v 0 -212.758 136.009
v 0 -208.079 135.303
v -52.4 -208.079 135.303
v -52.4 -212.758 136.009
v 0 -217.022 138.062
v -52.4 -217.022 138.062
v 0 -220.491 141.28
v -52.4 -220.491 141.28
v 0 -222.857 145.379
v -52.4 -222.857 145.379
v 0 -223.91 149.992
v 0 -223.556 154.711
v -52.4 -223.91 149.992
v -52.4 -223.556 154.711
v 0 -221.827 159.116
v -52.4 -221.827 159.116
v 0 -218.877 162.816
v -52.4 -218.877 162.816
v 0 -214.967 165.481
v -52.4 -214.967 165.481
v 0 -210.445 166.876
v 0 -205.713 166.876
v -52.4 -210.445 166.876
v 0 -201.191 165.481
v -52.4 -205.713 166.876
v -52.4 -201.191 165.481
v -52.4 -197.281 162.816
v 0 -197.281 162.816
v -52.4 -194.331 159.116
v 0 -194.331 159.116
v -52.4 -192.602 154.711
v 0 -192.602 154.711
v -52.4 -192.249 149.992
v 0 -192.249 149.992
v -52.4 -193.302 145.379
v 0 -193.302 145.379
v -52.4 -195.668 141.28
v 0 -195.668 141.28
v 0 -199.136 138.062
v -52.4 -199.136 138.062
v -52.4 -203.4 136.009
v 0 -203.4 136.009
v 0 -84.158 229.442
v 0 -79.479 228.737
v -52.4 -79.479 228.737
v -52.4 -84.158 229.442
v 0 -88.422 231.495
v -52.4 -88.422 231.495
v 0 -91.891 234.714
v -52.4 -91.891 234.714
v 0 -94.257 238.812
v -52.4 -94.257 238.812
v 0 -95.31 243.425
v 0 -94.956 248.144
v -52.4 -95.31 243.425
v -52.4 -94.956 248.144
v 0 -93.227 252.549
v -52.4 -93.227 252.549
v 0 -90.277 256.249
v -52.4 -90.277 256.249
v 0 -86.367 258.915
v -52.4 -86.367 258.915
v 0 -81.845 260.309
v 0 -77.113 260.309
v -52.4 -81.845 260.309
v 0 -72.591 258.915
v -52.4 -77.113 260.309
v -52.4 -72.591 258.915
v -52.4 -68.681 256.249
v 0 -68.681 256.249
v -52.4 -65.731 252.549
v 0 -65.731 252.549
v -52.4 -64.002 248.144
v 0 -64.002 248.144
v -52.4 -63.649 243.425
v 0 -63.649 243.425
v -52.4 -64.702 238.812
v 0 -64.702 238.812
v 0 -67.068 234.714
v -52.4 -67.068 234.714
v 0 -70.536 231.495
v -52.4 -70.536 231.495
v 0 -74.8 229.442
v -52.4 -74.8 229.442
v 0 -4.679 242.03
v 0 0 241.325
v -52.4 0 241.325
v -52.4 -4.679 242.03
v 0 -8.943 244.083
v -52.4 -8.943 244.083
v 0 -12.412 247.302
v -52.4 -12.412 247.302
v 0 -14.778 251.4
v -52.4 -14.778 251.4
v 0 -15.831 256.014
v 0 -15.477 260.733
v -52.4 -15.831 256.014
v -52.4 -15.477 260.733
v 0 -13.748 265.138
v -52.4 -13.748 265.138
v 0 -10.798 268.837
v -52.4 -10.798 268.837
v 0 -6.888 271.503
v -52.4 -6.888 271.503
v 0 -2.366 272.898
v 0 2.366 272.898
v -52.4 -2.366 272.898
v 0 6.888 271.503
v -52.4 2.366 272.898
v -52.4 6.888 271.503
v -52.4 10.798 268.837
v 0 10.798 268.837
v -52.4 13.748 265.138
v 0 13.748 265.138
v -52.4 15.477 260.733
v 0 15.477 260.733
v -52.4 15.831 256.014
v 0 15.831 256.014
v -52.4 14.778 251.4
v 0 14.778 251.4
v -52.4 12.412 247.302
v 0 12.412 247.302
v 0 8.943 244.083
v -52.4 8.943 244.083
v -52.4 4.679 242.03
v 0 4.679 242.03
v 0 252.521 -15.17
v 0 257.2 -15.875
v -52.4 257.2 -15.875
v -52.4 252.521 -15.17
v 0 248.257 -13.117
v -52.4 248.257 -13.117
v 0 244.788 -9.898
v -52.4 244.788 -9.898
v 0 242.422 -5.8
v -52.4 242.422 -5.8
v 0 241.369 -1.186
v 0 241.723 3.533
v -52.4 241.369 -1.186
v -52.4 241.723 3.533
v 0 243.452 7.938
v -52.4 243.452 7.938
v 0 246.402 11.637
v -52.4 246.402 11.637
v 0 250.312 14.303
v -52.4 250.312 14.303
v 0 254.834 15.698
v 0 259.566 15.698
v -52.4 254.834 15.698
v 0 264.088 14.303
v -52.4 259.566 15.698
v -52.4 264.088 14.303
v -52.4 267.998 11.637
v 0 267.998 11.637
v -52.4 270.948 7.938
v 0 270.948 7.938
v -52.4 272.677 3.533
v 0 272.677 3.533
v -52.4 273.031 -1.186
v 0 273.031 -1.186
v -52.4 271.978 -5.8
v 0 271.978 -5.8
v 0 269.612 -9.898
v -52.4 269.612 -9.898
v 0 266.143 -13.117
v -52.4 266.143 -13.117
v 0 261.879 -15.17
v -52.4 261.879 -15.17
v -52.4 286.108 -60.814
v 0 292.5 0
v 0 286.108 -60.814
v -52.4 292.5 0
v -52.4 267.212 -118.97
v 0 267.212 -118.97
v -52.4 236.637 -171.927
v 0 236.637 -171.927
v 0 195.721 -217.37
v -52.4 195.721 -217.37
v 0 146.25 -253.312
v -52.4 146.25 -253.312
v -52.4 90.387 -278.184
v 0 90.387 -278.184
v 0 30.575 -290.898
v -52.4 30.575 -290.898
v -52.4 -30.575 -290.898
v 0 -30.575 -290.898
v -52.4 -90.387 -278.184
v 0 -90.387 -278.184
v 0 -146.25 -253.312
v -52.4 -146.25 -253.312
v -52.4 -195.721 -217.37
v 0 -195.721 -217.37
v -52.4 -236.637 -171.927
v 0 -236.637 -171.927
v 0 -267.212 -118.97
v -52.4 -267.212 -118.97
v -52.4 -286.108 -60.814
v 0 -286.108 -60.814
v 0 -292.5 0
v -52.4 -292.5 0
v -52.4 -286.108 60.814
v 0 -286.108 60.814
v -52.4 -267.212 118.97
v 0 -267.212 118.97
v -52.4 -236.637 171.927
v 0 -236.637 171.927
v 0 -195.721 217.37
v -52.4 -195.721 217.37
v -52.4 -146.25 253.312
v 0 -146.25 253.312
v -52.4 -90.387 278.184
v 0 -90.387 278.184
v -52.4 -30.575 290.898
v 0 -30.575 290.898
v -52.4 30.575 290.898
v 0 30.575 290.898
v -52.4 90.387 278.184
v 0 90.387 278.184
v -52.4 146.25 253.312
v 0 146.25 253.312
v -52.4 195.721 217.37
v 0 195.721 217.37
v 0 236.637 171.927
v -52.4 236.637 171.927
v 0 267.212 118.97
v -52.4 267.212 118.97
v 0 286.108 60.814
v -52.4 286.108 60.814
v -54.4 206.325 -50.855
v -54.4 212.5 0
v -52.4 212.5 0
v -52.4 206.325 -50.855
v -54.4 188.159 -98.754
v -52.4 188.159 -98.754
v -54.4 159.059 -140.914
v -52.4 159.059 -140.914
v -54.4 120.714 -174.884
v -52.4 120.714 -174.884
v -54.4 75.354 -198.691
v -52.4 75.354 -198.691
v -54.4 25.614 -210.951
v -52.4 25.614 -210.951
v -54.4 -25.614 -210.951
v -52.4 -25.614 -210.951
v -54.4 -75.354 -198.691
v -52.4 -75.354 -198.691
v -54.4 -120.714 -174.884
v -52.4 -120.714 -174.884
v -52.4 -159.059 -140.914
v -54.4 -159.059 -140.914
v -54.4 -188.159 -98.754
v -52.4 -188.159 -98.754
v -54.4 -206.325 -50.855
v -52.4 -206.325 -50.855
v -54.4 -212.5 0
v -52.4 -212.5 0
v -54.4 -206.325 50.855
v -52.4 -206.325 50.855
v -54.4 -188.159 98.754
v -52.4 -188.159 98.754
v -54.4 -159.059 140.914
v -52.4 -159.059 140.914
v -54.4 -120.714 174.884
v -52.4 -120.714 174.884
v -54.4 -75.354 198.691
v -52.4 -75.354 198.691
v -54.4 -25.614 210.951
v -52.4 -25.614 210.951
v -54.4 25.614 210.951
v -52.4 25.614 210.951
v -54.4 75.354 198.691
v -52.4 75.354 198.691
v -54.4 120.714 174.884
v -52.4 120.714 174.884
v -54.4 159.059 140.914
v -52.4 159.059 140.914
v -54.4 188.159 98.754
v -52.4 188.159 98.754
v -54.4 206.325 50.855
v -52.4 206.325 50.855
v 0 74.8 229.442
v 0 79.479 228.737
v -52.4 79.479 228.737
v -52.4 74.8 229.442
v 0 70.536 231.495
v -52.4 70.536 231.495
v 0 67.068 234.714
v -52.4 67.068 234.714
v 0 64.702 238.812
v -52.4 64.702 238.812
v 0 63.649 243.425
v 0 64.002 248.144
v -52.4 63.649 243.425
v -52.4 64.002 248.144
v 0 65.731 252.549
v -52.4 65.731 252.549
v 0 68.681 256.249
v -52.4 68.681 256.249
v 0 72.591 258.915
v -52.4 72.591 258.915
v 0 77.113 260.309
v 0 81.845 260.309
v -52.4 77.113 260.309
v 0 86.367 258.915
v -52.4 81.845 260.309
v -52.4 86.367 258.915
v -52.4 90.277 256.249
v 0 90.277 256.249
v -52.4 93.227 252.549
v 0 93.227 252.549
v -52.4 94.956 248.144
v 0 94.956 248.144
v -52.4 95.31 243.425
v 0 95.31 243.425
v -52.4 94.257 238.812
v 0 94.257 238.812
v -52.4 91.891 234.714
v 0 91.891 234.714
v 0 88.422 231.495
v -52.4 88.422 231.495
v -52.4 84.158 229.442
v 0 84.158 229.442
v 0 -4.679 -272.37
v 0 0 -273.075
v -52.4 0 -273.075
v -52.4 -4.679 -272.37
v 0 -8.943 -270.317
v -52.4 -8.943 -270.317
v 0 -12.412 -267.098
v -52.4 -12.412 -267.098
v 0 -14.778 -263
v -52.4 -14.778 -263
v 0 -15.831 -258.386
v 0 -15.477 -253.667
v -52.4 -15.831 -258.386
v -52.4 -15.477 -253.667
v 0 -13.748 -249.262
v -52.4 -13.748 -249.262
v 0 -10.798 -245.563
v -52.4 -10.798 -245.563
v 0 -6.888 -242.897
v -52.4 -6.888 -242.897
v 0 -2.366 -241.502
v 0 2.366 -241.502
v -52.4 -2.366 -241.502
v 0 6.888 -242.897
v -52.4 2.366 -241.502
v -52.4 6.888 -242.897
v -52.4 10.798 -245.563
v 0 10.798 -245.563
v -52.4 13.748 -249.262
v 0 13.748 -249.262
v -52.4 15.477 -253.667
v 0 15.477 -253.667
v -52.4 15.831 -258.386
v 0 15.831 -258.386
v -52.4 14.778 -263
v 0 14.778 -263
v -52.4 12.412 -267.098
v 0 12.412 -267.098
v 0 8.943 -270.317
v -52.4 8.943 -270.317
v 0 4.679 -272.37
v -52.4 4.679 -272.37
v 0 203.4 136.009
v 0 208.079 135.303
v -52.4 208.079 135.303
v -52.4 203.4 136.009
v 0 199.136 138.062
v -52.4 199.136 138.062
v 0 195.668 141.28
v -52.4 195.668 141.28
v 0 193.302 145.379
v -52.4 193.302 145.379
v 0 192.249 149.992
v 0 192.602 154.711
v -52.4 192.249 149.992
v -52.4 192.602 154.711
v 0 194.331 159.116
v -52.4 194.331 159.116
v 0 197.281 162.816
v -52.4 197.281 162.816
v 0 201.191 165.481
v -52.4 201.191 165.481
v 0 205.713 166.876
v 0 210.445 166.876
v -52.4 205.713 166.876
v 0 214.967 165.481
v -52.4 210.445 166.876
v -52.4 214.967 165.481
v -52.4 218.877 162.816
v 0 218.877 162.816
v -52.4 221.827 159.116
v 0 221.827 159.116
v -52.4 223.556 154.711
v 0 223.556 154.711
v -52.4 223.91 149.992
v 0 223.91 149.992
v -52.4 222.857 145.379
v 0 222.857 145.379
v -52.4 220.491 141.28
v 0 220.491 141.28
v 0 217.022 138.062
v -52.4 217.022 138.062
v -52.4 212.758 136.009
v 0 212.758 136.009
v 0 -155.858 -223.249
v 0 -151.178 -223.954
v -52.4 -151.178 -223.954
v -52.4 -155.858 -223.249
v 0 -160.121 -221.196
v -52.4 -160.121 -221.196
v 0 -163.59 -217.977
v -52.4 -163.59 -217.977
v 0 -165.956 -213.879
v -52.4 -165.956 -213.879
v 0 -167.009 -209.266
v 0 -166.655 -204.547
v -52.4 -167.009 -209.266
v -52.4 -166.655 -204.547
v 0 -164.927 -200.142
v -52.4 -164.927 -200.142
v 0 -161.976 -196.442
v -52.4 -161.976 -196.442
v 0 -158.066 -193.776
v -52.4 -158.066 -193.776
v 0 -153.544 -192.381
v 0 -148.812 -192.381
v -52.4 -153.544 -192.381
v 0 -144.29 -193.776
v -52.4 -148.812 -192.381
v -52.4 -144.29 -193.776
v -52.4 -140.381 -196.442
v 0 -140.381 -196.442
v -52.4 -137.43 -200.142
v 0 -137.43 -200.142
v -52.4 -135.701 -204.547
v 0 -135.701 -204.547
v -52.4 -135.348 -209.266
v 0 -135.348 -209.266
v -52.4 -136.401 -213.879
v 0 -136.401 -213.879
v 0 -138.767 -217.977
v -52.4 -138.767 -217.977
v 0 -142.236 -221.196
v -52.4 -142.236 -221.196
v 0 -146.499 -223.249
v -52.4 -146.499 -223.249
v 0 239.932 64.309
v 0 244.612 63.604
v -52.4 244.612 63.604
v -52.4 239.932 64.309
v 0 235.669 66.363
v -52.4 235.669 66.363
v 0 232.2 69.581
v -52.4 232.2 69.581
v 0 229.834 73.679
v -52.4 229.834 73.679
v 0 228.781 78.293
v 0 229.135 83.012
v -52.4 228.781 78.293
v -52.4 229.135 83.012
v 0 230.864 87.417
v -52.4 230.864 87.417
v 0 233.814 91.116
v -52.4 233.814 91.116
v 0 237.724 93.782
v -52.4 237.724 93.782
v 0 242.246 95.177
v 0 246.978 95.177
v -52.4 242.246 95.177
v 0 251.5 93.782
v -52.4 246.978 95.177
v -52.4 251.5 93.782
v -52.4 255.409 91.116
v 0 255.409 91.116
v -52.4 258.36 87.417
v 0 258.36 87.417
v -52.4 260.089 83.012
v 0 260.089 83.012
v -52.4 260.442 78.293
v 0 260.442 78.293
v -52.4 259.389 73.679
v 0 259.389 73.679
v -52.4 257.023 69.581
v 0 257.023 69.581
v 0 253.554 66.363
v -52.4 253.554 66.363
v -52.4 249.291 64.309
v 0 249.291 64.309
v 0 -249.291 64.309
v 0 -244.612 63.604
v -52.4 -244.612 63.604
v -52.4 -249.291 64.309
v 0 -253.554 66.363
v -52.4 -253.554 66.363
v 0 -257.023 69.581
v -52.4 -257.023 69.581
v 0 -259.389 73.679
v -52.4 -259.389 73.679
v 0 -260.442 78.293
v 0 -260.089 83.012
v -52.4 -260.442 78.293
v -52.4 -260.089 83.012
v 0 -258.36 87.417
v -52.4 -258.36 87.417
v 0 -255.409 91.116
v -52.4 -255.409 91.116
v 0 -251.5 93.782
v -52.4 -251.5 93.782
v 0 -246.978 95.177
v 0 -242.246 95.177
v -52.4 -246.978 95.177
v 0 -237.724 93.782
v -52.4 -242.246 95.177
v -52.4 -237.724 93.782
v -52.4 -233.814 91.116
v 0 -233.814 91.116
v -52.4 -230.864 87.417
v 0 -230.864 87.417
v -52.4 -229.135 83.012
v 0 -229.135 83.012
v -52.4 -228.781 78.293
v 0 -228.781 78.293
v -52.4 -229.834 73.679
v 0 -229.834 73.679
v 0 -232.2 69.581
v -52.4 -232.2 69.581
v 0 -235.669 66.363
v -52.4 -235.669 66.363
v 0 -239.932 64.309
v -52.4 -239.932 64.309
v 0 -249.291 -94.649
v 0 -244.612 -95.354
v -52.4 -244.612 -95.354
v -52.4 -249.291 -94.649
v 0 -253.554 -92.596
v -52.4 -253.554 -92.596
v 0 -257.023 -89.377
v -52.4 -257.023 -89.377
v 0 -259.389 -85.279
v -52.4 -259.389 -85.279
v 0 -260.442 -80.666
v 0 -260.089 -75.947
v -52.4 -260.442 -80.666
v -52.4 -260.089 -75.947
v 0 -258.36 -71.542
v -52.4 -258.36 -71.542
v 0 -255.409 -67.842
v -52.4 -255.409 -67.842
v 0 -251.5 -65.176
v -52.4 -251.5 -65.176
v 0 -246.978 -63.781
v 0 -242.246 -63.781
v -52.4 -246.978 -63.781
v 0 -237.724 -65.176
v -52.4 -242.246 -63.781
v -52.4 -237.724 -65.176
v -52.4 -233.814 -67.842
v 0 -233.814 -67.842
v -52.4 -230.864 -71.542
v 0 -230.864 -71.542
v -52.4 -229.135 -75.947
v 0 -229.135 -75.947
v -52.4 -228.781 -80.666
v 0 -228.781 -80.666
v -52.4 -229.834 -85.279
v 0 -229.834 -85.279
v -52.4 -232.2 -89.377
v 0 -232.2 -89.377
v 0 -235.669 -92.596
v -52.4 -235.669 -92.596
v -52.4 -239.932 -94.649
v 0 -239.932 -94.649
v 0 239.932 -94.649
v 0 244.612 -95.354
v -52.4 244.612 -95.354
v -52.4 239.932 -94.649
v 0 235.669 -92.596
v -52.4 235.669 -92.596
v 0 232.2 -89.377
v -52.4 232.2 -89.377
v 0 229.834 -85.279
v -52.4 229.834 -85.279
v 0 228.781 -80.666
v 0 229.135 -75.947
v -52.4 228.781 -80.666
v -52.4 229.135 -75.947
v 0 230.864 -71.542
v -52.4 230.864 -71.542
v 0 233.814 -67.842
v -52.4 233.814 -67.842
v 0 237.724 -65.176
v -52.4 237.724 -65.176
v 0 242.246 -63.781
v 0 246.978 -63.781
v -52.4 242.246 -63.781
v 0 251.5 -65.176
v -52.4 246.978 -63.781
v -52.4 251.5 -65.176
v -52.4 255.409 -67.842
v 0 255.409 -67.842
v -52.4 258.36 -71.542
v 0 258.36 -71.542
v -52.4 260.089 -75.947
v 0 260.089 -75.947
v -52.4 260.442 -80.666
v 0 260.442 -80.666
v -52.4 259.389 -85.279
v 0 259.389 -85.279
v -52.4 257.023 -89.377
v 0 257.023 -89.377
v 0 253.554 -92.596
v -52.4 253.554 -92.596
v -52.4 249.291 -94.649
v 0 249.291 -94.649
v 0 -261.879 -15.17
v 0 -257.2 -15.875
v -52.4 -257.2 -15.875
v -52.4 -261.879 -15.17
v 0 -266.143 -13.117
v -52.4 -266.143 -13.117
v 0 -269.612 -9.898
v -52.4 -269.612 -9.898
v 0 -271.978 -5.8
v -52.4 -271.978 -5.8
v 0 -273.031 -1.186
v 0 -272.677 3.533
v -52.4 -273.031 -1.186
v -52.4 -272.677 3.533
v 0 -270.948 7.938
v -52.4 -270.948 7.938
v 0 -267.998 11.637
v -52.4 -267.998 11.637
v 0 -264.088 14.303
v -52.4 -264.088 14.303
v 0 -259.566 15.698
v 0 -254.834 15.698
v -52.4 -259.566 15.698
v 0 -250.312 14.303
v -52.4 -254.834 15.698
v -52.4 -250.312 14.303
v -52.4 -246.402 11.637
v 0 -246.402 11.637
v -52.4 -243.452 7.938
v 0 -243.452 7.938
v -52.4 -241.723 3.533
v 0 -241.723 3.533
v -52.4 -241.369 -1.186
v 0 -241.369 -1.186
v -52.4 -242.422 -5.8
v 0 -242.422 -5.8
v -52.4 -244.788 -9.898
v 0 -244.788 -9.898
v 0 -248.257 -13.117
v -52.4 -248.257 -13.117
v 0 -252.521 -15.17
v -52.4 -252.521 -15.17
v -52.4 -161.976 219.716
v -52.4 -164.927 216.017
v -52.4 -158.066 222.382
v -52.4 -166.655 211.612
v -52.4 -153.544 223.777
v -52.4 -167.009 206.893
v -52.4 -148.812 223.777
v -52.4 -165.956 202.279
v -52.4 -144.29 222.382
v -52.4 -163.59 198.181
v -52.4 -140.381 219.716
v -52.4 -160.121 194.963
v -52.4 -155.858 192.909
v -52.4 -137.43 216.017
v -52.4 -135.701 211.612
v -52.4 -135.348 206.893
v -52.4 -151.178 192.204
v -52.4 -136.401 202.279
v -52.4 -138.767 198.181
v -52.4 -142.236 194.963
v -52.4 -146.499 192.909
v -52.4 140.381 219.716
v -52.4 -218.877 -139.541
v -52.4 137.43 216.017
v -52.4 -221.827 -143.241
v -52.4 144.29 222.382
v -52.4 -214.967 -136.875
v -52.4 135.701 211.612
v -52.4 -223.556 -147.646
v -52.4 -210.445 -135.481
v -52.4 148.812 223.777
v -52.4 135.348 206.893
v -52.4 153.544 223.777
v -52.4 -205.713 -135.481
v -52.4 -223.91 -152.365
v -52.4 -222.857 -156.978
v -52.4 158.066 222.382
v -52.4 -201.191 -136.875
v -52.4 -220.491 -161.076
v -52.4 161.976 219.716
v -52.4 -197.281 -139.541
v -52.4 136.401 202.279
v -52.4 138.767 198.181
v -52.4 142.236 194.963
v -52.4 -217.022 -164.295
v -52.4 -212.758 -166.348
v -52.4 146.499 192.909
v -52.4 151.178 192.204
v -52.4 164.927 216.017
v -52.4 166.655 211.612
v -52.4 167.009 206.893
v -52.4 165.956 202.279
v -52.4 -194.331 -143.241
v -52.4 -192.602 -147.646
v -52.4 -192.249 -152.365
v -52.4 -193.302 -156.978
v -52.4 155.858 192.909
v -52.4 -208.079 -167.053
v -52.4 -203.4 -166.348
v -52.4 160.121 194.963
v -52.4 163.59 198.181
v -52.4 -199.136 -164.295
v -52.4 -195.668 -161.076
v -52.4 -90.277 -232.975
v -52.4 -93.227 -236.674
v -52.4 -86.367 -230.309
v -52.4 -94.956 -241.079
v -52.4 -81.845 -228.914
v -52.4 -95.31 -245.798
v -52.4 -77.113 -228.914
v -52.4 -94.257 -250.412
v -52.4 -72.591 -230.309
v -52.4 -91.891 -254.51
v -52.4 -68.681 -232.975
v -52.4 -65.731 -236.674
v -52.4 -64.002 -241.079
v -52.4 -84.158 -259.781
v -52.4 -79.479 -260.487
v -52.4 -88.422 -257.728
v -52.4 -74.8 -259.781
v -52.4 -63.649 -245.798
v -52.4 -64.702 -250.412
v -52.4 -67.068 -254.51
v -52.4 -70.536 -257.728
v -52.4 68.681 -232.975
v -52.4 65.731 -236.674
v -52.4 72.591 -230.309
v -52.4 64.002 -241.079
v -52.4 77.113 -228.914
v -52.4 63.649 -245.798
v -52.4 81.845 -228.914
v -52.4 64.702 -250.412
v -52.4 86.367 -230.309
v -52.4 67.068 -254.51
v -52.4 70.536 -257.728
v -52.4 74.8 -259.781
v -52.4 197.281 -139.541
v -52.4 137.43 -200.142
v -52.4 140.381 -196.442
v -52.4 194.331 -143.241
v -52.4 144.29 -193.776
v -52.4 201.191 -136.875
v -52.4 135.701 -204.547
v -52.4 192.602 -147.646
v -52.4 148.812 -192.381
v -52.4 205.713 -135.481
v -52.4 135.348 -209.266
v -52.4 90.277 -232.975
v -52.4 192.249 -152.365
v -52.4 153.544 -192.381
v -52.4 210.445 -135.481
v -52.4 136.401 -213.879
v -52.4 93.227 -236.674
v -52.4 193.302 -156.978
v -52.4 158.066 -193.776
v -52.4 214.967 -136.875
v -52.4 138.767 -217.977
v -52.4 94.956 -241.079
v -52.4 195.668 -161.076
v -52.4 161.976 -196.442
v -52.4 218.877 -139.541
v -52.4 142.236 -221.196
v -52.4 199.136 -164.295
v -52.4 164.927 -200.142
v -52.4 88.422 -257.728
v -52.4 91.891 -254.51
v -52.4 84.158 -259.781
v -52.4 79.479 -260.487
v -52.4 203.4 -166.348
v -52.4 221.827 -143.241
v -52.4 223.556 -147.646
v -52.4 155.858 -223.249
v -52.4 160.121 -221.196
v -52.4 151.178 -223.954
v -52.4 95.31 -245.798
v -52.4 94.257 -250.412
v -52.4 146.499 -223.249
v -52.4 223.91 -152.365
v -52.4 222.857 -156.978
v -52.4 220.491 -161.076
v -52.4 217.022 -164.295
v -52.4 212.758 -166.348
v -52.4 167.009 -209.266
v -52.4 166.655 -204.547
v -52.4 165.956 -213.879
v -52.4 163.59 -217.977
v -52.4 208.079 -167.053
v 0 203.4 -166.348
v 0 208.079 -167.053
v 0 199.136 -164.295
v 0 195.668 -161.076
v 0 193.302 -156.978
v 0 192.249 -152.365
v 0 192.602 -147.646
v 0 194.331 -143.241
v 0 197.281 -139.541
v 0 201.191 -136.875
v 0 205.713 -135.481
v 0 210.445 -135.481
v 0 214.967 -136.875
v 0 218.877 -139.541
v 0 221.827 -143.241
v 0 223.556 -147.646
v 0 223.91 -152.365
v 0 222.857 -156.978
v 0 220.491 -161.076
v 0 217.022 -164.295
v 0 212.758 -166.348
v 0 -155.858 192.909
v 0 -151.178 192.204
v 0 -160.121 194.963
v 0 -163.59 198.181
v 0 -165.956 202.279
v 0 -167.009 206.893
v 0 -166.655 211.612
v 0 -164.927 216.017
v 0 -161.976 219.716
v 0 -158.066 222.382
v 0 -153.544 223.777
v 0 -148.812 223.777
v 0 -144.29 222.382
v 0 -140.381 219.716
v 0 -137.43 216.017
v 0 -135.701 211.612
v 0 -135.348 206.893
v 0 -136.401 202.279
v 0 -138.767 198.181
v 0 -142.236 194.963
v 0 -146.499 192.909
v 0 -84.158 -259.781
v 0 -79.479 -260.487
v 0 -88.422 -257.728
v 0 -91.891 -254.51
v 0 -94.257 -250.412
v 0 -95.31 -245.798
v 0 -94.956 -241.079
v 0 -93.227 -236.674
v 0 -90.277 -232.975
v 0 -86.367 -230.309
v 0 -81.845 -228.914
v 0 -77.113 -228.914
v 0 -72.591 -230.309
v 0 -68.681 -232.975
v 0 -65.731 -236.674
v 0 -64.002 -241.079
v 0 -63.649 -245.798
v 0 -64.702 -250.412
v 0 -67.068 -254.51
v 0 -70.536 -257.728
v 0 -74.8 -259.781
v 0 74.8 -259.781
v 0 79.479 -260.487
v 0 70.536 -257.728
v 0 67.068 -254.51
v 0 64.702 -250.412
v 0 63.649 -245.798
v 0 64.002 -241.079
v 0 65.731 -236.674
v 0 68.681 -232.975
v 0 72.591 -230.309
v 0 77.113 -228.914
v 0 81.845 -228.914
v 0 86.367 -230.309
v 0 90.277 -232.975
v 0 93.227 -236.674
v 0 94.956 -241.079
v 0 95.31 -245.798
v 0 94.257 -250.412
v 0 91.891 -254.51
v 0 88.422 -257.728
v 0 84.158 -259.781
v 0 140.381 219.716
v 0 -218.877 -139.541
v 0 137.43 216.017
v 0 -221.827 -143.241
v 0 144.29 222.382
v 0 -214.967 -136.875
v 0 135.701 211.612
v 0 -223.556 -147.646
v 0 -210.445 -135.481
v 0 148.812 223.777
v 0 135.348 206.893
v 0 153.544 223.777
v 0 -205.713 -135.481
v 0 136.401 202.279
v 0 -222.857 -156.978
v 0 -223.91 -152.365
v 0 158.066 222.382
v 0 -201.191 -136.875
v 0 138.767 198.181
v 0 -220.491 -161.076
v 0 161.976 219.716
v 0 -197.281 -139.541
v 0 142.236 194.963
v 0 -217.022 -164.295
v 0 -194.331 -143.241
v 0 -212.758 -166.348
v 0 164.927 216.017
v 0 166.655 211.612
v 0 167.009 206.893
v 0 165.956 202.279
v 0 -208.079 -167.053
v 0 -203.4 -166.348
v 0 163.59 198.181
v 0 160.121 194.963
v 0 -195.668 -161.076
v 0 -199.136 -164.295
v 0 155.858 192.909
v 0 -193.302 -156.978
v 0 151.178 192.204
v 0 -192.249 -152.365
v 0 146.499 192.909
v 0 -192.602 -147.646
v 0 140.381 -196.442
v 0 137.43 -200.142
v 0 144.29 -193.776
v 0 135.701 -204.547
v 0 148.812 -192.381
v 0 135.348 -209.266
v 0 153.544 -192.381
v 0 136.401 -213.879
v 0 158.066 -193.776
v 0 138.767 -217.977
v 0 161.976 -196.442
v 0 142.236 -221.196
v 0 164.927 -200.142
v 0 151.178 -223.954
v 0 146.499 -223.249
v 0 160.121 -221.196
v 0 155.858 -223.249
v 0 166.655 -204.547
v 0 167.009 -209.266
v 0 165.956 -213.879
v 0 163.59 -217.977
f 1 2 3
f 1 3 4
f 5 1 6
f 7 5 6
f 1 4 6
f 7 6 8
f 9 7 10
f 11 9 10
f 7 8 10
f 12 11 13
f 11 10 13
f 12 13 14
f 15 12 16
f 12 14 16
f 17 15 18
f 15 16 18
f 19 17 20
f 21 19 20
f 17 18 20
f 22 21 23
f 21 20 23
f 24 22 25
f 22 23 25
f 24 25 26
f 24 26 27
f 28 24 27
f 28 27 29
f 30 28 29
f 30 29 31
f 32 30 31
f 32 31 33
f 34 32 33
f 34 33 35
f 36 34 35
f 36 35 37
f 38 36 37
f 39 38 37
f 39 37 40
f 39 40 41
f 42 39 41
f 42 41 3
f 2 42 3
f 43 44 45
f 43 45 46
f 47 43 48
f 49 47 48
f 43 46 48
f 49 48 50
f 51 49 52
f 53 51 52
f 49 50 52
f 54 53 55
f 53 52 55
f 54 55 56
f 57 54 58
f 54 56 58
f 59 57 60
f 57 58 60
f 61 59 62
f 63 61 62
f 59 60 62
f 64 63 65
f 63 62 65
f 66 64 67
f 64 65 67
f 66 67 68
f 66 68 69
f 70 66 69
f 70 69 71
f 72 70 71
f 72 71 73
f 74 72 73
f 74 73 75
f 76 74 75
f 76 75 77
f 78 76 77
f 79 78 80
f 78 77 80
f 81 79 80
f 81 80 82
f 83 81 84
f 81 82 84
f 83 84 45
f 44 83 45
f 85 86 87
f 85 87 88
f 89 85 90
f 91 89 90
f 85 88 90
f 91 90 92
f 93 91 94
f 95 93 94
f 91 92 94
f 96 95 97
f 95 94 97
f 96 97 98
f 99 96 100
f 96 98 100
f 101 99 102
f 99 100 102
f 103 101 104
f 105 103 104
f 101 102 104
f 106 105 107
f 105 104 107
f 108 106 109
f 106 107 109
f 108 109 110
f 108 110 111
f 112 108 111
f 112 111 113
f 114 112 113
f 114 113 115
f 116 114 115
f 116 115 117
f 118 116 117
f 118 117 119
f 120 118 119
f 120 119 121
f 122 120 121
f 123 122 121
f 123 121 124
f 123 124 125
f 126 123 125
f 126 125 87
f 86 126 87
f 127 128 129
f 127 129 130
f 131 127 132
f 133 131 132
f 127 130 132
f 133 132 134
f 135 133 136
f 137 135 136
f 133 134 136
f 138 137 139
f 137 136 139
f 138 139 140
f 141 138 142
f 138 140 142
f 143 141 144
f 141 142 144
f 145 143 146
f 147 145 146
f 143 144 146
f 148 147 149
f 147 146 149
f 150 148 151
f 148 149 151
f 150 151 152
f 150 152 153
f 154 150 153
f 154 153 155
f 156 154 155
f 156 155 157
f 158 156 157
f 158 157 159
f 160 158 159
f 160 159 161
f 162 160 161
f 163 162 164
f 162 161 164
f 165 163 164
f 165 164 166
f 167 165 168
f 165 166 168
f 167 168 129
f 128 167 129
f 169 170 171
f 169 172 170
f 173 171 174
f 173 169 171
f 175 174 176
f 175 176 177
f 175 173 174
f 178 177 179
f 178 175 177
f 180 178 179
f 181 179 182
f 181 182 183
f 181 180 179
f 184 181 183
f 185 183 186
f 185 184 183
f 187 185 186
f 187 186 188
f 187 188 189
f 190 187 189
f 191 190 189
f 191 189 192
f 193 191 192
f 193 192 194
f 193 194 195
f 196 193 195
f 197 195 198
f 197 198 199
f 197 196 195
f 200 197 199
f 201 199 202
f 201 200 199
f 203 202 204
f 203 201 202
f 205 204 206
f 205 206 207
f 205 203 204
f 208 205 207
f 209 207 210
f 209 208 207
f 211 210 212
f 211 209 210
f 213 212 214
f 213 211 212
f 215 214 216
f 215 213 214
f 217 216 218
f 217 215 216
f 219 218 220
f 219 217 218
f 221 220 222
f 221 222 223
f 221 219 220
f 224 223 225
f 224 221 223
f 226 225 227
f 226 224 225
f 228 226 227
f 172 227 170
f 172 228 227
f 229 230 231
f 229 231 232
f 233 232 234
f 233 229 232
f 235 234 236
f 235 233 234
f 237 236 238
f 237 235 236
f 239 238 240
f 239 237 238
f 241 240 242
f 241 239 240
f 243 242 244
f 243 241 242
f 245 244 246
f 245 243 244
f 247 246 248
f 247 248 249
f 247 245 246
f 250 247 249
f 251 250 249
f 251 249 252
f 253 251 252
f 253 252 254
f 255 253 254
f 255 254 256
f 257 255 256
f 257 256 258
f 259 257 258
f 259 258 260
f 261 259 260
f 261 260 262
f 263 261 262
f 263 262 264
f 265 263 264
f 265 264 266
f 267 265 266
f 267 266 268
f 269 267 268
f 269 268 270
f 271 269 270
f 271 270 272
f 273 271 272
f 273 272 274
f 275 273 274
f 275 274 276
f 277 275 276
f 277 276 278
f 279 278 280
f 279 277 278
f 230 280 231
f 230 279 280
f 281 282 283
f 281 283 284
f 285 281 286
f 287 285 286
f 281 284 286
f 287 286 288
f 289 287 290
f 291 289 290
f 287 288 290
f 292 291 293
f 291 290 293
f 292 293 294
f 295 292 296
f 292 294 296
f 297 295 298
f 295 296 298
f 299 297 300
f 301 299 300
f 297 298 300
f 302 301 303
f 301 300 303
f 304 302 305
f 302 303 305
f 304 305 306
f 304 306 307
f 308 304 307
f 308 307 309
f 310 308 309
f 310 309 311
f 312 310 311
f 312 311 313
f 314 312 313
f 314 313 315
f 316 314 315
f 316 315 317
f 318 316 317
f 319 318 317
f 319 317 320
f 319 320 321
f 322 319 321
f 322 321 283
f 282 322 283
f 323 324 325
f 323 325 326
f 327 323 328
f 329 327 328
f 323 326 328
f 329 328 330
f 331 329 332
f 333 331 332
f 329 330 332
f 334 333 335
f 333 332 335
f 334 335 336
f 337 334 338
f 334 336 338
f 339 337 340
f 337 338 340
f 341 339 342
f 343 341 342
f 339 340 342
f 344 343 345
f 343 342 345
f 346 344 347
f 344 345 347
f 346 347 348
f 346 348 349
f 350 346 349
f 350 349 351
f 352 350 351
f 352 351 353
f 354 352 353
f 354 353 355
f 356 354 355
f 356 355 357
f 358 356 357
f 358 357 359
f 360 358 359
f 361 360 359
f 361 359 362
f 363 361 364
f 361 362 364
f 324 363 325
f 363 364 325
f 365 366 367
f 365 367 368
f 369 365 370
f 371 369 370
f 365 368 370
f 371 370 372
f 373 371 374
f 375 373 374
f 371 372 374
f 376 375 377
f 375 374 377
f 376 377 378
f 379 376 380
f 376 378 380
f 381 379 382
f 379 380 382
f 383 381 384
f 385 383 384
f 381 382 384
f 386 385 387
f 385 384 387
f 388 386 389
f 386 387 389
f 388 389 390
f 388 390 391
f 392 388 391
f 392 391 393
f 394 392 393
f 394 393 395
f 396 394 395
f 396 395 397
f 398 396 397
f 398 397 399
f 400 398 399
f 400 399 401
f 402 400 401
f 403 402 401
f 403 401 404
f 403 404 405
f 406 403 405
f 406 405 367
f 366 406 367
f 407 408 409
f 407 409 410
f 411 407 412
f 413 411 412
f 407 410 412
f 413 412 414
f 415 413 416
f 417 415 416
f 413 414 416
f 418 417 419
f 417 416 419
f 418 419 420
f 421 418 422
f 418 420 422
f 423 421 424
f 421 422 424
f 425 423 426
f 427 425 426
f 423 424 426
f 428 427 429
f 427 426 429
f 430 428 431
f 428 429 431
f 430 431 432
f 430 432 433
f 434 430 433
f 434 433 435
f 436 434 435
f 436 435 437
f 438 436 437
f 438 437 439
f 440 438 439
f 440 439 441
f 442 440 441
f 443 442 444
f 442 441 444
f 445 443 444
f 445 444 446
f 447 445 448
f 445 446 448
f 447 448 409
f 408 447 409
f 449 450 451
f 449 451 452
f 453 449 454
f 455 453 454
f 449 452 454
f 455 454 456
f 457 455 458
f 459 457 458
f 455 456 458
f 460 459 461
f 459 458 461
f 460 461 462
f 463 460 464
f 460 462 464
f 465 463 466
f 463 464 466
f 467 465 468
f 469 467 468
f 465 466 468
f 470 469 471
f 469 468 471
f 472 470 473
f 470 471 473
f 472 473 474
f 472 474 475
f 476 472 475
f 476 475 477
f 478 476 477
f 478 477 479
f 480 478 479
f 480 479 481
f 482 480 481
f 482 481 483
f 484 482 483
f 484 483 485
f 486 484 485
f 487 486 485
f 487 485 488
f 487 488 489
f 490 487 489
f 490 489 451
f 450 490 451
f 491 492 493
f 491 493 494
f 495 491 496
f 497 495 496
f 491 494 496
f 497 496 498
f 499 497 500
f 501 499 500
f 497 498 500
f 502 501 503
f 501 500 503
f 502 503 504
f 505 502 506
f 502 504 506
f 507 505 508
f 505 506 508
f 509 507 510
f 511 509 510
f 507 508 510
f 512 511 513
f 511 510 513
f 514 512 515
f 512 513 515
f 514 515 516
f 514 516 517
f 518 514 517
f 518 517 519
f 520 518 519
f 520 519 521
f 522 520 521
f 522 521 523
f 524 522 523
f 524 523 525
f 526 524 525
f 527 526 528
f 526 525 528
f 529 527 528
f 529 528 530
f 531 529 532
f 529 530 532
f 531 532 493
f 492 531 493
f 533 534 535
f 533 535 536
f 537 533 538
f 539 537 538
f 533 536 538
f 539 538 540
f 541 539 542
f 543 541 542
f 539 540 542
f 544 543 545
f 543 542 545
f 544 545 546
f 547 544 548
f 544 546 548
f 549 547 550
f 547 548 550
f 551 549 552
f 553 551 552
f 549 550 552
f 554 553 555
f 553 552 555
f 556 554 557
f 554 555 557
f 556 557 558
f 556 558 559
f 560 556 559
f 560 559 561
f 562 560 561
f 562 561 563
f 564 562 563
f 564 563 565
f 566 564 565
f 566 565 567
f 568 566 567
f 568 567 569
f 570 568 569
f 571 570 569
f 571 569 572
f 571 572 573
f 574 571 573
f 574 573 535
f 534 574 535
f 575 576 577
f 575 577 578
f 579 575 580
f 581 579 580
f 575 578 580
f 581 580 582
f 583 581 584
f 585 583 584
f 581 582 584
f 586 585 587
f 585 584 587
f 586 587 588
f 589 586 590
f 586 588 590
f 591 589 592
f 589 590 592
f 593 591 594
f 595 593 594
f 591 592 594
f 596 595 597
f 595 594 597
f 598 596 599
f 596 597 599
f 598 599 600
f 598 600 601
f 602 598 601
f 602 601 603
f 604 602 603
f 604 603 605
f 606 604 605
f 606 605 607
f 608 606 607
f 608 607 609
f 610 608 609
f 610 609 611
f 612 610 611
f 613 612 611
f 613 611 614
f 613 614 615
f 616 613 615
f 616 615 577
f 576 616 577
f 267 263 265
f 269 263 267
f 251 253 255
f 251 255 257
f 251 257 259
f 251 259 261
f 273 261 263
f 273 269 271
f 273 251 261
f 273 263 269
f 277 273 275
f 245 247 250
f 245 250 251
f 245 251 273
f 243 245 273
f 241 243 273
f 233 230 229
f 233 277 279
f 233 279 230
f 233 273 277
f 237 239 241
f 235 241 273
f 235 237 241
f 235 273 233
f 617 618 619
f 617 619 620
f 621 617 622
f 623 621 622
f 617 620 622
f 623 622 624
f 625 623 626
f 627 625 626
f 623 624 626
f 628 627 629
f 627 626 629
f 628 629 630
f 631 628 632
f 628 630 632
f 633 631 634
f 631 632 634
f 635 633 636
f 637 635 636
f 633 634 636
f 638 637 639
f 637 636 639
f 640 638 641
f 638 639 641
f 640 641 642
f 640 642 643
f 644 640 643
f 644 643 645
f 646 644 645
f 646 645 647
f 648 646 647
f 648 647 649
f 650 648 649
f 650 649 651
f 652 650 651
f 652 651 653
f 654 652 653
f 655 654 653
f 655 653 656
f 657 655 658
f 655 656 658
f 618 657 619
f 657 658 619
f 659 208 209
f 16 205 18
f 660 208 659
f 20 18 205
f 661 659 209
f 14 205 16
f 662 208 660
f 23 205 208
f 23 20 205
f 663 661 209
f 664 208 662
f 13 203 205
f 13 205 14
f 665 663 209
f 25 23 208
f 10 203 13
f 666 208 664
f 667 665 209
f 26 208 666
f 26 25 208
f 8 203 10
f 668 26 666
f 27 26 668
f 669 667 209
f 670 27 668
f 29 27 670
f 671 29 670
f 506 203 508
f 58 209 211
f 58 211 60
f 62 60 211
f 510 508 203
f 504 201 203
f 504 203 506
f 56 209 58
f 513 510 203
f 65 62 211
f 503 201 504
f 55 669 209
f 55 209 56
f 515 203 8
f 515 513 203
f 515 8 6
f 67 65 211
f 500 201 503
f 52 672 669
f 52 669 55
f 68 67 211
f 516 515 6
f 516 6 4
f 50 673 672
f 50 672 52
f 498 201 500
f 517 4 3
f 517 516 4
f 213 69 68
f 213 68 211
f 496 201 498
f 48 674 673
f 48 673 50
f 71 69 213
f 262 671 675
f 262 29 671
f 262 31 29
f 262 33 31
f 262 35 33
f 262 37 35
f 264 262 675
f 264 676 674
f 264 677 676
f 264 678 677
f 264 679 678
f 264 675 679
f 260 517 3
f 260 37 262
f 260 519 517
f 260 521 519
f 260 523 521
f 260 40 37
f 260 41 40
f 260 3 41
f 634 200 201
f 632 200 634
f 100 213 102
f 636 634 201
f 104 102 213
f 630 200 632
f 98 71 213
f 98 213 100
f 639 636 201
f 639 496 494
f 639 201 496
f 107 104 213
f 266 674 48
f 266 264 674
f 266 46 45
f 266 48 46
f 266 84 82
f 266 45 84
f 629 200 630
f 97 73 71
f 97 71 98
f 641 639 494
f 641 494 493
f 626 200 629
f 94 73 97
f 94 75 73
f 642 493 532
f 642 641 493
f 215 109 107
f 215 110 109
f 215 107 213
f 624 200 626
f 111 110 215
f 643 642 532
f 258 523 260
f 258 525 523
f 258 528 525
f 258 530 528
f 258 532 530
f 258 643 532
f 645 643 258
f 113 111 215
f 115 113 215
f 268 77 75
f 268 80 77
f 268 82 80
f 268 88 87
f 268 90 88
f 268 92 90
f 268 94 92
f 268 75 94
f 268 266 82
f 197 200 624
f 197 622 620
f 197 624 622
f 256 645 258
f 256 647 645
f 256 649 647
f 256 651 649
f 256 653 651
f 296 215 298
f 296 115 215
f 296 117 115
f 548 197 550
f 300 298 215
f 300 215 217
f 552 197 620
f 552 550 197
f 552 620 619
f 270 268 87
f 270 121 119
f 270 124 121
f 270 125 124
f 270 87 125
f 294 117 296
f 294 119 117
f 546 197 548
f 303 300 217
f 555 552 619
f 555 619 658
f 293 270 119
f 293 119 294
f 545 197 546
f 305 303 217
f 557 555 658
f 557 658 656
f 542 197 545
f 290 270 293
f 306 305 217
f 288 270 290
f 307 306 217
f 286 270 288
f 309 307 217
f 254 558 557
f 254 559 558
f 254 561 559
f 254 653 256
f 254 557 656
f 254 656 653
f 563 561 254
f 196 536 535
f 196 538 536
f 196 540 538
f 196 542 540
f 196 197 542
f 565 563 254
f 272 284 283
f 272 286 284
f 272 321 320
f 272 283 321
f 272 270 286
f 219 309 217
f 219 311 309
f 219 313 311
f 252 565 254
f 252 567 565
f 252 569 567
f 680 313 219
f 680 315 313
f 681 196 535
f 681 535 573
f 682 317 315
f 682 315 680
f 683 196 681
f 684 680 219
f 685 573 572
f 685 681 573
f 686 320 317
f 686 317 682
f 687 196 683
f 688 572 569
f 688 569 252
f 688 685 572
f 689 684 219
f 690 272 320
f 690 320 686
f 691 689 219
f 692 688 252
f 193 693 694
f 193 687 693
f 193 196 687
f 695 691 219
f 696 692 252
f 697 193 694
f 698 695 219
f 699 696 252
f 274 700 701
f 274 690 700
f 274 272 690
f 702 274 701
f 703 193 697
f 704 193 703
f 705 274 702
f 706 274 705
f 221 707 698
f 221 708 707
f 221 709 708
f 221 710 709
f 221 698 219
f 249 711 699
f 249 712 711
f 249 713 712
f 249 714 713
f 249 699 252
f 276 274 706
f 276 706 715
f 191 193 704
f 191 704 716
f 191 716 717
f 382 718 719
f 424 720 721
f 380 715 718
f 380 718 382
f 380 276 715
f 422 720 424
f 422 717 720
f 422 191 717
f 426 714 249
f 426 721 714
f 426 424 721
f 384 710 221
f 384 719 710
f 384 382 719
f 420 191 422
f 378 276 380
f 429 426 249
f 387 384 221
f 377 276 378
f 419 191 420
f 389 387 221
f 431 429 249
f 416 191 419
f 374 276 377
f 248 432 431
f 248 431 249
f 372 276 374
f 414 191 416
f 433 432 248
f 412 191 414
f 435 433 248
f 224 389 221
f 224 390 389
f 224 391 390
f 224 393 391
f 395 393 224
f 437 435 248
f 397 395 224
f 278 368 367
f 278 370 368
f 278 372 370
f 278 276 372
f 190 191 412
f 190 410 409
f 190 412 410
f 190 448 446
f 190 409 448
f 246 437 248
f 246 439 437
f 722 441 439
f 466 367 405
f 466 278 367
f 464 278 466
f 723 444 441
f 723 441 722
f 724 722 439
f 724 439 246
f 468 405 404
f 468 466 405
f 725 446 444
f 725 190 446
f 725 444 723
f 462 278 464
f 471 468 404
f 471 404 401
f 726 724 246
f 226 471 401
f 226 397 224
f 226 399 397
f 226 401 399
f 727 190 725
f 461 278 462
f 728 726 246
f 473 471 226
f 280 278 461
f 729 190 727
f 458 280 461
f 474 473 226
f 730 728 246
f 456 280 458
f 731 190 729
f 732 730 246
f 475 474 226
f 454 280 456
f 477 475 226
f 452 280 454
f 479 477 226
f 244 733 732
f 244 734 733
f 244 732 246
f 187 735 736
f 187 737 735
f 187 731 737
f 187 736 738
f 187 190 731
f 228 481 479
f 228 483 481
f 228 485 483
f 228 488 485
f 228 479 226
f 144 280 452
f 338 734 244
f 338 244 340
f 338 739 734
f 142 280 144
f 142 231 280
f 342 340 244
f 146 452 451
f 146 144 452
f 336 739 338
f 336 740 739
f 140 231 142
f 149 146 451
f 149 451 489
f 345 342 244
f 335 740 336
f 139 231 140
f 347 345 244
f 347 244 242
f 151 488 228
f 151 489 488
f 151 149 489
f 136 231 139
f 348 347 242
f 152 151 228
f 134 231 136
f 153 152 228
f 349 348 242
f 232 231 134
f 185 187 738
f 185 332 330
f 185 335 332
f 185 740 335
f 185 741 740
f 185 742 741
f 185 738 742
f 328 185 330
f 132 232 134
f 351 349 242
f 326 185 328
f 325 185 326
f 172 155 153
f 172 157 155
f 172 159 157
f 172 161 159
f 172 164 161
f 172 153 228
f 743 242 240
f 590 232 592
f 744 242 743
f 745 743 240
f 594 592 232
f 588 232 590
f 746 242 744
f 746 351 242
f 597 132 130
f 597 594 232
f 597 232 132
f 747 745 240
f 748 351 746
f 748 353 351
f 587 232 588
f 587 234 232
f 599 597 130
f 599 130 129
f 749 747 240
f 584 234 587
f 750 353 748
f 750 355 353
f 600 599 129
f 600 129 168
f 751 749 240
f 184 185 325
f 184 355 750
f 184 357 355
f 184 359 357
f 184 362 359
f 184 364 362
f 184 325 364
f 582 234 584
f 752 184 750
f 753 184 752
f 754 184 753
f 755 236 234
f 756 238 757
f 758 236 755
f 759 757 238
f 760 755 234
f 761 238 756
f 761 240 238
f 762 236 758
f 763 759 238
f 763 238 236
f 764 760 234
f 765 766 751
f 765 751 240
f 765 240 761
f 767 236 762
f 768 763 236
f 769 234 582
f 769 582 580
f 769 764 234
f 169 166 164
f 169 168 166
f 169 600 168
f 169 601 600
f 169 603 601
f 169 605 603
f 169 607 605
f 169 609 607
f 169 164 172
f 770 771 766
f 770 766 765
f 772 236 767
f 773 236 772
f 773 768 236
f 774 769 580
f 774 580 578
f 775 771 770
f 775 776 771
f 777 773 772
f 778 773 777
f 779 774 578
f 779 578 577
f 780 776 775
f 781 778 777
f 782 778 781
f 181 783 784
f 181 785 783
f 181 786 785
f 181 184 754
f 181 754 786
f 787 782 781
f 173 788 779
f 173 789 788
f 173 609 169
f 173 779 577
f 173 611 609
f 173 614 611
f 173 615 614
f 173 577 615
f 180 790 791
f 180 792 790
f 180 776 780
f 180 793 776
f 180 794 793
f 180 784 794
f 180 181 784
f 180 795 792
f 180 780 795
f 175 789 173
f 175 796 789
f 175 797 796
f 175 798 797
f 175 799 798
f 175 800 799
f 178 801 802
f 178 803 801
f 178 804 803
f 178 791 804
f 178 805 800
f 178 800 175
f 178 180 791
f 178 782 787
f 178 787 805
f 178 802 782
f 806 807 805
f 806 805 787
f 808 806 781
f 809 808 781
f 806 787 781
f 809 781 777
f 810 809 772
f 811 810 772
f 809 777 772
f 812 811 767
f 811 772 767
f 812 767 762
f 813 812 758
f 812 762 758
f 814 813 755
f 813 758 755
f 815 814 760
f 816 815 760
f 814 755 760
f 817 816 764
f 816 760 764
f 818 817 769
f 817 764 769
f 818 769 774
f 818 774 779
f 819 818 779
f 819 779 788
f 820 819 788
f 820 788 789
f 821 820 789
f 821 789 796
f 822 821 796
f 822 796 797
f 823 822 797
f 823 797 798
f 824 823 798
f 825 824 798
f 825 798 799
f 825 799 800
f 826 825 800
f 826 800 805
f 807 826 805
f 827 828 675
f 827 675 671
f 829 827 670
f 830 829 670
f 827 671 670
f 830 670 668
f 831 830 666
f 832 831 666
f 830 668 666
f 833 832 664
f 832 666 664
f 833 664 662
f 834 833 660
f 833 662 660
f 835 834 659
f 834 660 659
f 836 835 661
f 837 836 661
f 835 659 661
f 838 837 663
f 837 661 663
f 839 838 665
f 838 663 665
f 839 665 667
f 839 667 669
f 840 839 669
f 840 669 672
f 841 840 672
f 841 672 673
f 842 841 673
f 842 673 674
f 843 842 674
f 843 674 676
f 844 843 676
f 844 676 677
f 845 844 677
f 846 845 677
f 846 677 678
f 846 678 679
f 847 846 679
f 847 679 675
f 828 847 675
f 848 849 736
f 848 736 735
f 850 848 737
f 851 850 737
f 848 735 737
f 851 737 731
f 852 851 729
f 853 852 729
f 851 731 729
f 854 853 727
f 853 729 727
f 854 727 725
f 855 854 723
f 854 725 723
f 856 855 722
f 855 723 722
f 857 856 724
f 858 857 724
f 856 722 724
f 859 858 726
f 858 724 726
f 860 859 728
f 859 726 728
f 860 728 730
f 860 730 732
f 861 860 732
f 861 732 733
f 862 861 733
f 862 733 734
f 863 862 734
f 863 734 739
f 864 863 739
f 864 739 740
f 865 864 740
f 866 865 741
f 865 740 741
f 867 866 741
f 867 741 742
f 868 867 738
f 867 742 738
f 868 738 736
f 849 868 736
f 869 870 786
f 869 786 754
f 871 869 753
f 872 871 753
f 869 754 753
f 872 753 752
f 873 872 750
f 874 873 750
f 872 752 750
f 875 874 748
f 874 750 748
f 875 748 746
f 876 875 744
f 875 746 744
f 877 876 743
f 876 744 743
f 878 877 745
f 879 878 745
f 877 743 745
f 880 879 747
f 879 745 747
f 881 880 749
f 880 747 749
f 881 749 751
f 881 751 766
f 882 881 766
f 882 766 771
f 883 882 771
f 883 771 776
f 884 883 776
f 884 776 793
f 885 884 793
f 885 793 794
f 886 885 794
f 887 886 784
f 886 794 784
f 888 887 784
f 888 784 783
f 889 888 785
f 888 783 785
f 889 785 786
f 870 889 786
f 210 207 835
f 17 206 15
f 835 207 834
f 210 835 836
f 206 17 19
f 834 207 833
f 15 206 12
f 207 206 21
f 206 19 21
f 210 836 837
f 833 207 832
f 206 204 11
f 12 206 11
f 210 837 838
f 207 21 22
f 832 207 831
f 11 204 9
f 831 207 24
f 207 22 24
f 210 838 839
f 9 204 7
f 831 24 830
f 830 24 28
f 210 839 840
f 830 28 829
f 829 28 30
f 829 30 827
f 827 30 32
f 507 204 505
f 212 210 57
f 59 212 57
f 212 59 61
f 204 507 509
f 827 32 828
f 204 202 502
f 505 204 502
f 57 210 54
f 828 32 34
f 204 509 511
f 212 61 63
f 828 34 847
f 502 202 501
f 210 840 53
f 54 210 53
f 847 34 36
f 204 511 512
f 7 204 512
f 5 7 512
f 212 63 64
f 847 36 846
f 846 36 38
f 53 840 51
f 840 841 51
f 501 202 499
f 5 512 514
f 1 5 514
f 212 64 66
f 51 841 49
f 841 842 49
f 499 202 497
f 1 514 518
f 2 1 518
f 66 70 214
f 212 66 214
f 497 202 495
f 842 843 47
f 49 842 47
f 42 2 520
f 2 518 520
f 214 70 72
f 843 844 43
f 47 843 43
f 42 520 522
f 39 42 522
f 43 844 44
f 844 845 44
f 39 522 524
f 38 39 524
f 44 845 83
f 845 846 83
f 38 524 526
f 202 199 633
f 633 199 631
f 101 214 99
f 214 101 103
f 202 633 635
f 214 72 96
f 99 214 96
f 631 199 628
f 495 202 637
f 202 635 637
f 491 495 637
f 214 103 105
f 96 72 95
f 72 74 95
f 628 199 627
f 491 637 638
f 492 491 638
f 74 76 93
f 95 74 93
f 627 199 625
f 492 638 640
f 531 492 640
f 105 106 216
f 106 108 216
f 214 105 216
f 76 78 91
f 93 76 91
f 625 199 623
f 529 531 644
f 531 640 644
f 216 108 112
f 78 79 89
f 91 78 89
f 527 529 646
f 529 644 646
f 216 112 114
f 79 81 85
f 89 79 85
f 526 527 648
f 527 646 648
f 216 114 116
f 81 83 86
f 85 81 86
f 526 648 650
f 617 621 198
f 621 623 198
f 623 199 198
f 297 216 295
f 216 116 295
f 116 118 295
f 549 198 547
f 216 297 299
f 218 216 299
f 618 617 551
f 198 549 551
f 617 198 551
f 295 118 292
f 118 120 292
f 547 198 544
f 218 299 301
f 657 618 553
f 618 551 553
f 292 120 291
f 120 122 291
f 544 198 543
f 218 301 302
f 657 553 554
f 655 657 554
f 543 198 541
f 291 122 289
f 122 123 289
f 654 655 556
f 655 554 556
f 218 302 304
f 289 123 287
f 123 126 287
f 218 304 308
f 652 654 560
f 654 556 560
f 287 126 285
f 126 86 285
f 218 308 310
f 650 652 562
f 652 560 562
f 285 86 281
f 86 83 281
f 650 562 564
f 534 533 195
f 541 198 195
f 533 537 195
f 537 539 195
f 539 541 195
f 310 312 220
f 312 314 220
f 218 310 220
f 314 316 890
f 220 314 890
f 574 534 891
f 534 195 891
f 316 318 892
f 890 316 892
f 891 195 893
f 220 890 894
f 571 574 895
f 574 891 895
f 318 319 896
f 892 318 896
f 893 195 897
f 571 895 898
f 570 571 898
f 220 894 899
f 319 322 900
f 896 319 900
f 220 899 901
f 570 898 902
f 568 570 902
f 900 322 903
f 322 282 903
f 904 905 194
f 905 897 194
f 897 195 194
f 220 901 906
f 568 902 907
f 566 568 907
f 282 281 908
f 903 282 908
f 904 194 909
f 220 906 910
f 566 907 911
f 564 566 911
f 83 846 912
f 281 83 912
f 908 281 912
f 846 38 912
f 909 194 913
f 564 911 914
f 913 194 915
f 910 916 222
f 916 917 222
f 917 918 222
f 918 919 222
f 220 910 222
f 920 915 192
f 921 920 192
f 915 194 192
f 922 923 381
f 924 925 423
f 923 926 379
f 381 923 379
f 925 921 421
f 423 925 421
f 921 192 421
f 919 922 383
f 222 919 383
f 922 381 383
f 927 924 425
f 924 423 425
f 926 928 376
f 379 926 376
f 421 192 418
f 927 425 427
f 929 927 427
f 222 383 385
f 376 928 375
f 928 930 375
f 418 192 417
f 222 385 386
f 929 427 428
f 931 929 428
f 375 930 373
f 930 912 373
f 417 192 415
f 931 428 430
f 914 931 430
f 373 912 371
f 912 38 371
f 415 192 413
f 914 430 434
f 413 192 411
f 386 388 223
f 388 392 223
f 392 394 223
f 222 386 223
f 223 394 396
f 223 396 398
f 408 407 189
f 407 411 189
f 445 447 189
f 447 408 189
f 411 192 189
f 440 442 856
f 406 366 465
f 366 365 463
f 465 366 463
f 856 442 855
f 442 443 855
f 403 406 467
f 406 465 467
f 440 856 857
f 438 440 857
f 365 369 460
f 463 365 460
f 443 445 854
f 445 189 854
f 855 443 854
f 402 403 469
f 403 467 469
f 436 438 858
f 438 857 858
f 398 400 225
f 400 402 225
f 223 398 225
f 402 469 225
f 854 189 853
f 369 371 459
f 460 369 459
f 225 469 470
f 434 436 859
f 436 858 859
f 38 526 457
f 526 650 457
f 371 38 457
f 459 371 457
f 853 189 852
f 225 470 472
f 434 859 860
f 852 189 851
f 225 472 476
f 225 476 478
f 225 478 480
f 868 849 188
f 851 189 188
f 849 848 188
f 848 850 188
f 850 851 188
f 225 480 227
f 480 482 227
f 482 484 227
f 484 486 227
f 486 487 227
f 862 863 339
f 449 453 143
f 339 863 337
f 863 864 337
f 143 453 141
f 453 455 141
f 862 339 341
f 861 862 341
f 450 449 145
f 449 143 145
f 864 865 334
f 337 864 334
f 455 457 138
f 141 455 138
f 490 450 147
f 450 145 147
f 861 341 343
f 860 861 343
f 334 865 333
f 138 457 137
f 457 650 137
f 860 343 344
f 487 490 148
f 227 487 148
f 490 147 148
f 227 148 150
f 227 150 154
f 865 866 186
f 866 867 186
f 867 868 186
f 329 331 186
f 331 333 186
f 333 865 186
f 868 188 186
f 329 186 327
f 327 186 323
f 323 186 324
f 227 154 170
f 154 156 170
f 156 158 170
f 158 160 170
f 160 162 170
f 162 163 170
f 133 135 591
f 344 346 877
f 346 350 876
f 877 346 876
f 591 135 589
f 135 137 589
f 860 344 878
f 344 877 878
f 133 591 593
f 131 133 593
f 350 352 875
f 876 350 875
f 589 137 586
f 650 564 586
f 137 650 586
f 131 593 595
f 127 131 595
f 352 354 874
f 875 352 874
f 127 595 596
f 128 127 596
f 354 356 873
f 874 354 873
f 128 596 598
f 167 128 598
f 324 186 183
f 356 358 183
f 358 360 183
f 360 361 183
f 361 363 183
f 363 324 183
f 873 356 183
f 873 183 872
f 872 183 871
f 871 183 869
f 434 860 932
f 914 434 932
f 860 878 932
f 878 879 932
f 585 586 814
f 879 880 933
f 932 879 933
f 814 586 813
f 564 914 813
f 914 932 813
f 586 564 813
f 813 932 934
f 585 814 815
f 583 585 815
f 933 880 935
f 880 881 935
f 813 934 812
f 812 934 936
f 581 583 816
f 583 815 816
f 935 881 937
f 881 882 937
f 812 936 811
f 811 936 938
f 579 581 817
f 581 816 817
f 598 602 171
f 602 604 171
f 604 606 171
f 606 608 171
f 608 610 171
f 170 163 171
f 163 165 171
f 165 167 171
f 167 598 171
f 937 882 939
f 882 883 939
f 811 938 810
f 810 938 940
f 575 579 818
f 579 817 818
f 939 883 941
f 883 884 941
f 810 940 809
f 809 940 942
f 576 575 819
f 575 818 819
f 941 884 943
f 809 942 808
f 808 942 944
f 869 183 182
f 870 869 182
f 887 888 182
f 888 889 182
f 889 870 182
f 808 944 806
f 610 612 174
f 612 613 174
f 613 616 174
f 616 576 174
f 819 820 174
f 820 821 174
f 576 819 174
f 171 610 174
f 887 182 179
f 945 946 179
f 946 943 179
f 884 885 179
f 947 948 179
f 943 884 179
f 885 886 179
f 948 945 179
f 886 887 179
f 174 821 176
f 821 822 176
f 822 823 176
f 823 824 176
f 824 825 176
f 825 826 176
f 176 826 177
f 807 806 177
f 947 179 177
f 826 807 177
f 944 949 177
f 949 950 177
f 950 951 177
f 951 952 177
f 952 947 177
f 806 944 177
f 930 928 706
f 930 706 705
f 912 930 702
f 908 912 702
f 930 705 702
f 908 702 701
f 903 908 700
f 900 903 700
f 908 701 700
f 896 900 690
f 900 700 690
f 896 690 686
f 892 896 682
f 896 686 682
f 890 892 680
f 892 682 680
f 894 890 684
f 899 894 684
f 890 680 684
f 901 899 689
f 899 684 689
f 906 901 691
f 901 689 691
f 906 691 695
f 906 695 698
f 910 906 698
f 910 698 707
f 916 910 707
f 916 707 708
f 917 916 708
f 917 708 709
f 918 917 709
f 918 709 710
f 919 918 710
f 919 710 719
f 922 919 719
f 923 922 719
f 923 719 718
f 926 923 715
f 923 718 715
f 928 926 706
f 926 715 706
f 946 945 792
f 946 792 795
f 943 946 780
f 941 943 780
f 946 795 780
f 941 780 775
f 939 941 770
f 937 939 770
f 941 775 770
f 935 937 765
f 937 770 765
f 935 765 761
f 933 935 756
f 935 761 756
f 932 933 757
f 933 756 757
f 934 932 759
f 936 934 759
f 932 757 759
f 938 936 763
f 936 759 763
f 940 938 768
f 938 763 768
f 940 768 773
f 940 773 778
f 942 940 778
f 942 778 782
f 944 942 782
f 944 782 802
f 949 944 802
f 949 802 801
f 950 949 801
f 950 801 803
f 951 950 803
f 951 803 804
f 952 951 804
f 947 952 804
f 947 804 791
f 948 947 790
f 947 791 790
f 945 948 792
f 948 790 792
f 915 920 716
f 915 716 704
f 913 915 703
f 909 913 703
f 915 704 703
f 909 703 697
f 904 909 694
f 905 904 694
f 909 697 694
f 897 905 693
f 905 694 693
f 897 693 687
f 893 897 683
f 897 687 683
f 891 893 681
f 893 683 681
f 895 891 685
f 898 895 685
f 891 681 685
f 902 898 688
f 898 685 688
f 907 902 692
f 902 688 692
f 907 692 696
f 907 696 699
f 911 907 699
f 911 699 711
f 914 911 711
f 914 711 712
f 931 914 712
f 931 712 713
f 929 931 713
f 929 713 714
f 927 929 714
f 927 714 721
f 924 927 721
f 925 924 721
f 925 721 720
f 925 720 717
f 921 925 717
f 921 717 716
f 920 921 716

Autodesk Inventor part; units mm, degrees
ref_plane "YZ Plane" through (0, 0, 0) normal (1, 0, 0) x (0, 1, 0)
ref_plane "XZ Plane" through (0, 0, 0) normal (0, 1, 0) x (-1, 0, 0)
ref_plane "XY Plane" through (0, 0, 0) normal (0, 0, 1) x (1, 0, 0)
sketch "Sketch1" plane through (0, 0, 0) normal (0, 0, 1) x (1, 0, 0)
  line L0 (0, 0) -> (-284.4922, 0)
  line L1 (0, 0) -> (0, 292.5)
  line L2 (0, 292.5) -> (-52.4, 292.5)
  line L3 (-52.4, 292.5) -> (-52.4, 212.5)
  line L4 (-52.4, 212.5) -> (-54.4, 212.5)
  line L5 (-54.4, 212.5) -> (-54.4, 0)
  dimension "d0" = 585
  dimension "d1" = 52.4
  dimension "d2" = 2
  dimension "d3" = 425
revolve "Revolution1" add sketch "Sketch1" angle 360 about axis through (0, 0, 0) along (-1, 0, 0)
sketch "Sketch2" plane through (0, 0, 0) normal (1, 0, 0) x (0, 0, -1)
  point P0 (0, 0)
  point P1 (0, 257.2)
  dimension "d5" = 257.2
hole "Hole1" at (0, 257.2, 0) direction (-1, 0, 0) diameter 31.75 end up to surface
pattern_circular "Circular Pattern1" count 20 over 360 about axis through (-26.2, 0, 0) along (1, 0, 0) of "Hole1"
properties part number "Blind Flange 14 in" material "ASTM A105 Gr.B"
